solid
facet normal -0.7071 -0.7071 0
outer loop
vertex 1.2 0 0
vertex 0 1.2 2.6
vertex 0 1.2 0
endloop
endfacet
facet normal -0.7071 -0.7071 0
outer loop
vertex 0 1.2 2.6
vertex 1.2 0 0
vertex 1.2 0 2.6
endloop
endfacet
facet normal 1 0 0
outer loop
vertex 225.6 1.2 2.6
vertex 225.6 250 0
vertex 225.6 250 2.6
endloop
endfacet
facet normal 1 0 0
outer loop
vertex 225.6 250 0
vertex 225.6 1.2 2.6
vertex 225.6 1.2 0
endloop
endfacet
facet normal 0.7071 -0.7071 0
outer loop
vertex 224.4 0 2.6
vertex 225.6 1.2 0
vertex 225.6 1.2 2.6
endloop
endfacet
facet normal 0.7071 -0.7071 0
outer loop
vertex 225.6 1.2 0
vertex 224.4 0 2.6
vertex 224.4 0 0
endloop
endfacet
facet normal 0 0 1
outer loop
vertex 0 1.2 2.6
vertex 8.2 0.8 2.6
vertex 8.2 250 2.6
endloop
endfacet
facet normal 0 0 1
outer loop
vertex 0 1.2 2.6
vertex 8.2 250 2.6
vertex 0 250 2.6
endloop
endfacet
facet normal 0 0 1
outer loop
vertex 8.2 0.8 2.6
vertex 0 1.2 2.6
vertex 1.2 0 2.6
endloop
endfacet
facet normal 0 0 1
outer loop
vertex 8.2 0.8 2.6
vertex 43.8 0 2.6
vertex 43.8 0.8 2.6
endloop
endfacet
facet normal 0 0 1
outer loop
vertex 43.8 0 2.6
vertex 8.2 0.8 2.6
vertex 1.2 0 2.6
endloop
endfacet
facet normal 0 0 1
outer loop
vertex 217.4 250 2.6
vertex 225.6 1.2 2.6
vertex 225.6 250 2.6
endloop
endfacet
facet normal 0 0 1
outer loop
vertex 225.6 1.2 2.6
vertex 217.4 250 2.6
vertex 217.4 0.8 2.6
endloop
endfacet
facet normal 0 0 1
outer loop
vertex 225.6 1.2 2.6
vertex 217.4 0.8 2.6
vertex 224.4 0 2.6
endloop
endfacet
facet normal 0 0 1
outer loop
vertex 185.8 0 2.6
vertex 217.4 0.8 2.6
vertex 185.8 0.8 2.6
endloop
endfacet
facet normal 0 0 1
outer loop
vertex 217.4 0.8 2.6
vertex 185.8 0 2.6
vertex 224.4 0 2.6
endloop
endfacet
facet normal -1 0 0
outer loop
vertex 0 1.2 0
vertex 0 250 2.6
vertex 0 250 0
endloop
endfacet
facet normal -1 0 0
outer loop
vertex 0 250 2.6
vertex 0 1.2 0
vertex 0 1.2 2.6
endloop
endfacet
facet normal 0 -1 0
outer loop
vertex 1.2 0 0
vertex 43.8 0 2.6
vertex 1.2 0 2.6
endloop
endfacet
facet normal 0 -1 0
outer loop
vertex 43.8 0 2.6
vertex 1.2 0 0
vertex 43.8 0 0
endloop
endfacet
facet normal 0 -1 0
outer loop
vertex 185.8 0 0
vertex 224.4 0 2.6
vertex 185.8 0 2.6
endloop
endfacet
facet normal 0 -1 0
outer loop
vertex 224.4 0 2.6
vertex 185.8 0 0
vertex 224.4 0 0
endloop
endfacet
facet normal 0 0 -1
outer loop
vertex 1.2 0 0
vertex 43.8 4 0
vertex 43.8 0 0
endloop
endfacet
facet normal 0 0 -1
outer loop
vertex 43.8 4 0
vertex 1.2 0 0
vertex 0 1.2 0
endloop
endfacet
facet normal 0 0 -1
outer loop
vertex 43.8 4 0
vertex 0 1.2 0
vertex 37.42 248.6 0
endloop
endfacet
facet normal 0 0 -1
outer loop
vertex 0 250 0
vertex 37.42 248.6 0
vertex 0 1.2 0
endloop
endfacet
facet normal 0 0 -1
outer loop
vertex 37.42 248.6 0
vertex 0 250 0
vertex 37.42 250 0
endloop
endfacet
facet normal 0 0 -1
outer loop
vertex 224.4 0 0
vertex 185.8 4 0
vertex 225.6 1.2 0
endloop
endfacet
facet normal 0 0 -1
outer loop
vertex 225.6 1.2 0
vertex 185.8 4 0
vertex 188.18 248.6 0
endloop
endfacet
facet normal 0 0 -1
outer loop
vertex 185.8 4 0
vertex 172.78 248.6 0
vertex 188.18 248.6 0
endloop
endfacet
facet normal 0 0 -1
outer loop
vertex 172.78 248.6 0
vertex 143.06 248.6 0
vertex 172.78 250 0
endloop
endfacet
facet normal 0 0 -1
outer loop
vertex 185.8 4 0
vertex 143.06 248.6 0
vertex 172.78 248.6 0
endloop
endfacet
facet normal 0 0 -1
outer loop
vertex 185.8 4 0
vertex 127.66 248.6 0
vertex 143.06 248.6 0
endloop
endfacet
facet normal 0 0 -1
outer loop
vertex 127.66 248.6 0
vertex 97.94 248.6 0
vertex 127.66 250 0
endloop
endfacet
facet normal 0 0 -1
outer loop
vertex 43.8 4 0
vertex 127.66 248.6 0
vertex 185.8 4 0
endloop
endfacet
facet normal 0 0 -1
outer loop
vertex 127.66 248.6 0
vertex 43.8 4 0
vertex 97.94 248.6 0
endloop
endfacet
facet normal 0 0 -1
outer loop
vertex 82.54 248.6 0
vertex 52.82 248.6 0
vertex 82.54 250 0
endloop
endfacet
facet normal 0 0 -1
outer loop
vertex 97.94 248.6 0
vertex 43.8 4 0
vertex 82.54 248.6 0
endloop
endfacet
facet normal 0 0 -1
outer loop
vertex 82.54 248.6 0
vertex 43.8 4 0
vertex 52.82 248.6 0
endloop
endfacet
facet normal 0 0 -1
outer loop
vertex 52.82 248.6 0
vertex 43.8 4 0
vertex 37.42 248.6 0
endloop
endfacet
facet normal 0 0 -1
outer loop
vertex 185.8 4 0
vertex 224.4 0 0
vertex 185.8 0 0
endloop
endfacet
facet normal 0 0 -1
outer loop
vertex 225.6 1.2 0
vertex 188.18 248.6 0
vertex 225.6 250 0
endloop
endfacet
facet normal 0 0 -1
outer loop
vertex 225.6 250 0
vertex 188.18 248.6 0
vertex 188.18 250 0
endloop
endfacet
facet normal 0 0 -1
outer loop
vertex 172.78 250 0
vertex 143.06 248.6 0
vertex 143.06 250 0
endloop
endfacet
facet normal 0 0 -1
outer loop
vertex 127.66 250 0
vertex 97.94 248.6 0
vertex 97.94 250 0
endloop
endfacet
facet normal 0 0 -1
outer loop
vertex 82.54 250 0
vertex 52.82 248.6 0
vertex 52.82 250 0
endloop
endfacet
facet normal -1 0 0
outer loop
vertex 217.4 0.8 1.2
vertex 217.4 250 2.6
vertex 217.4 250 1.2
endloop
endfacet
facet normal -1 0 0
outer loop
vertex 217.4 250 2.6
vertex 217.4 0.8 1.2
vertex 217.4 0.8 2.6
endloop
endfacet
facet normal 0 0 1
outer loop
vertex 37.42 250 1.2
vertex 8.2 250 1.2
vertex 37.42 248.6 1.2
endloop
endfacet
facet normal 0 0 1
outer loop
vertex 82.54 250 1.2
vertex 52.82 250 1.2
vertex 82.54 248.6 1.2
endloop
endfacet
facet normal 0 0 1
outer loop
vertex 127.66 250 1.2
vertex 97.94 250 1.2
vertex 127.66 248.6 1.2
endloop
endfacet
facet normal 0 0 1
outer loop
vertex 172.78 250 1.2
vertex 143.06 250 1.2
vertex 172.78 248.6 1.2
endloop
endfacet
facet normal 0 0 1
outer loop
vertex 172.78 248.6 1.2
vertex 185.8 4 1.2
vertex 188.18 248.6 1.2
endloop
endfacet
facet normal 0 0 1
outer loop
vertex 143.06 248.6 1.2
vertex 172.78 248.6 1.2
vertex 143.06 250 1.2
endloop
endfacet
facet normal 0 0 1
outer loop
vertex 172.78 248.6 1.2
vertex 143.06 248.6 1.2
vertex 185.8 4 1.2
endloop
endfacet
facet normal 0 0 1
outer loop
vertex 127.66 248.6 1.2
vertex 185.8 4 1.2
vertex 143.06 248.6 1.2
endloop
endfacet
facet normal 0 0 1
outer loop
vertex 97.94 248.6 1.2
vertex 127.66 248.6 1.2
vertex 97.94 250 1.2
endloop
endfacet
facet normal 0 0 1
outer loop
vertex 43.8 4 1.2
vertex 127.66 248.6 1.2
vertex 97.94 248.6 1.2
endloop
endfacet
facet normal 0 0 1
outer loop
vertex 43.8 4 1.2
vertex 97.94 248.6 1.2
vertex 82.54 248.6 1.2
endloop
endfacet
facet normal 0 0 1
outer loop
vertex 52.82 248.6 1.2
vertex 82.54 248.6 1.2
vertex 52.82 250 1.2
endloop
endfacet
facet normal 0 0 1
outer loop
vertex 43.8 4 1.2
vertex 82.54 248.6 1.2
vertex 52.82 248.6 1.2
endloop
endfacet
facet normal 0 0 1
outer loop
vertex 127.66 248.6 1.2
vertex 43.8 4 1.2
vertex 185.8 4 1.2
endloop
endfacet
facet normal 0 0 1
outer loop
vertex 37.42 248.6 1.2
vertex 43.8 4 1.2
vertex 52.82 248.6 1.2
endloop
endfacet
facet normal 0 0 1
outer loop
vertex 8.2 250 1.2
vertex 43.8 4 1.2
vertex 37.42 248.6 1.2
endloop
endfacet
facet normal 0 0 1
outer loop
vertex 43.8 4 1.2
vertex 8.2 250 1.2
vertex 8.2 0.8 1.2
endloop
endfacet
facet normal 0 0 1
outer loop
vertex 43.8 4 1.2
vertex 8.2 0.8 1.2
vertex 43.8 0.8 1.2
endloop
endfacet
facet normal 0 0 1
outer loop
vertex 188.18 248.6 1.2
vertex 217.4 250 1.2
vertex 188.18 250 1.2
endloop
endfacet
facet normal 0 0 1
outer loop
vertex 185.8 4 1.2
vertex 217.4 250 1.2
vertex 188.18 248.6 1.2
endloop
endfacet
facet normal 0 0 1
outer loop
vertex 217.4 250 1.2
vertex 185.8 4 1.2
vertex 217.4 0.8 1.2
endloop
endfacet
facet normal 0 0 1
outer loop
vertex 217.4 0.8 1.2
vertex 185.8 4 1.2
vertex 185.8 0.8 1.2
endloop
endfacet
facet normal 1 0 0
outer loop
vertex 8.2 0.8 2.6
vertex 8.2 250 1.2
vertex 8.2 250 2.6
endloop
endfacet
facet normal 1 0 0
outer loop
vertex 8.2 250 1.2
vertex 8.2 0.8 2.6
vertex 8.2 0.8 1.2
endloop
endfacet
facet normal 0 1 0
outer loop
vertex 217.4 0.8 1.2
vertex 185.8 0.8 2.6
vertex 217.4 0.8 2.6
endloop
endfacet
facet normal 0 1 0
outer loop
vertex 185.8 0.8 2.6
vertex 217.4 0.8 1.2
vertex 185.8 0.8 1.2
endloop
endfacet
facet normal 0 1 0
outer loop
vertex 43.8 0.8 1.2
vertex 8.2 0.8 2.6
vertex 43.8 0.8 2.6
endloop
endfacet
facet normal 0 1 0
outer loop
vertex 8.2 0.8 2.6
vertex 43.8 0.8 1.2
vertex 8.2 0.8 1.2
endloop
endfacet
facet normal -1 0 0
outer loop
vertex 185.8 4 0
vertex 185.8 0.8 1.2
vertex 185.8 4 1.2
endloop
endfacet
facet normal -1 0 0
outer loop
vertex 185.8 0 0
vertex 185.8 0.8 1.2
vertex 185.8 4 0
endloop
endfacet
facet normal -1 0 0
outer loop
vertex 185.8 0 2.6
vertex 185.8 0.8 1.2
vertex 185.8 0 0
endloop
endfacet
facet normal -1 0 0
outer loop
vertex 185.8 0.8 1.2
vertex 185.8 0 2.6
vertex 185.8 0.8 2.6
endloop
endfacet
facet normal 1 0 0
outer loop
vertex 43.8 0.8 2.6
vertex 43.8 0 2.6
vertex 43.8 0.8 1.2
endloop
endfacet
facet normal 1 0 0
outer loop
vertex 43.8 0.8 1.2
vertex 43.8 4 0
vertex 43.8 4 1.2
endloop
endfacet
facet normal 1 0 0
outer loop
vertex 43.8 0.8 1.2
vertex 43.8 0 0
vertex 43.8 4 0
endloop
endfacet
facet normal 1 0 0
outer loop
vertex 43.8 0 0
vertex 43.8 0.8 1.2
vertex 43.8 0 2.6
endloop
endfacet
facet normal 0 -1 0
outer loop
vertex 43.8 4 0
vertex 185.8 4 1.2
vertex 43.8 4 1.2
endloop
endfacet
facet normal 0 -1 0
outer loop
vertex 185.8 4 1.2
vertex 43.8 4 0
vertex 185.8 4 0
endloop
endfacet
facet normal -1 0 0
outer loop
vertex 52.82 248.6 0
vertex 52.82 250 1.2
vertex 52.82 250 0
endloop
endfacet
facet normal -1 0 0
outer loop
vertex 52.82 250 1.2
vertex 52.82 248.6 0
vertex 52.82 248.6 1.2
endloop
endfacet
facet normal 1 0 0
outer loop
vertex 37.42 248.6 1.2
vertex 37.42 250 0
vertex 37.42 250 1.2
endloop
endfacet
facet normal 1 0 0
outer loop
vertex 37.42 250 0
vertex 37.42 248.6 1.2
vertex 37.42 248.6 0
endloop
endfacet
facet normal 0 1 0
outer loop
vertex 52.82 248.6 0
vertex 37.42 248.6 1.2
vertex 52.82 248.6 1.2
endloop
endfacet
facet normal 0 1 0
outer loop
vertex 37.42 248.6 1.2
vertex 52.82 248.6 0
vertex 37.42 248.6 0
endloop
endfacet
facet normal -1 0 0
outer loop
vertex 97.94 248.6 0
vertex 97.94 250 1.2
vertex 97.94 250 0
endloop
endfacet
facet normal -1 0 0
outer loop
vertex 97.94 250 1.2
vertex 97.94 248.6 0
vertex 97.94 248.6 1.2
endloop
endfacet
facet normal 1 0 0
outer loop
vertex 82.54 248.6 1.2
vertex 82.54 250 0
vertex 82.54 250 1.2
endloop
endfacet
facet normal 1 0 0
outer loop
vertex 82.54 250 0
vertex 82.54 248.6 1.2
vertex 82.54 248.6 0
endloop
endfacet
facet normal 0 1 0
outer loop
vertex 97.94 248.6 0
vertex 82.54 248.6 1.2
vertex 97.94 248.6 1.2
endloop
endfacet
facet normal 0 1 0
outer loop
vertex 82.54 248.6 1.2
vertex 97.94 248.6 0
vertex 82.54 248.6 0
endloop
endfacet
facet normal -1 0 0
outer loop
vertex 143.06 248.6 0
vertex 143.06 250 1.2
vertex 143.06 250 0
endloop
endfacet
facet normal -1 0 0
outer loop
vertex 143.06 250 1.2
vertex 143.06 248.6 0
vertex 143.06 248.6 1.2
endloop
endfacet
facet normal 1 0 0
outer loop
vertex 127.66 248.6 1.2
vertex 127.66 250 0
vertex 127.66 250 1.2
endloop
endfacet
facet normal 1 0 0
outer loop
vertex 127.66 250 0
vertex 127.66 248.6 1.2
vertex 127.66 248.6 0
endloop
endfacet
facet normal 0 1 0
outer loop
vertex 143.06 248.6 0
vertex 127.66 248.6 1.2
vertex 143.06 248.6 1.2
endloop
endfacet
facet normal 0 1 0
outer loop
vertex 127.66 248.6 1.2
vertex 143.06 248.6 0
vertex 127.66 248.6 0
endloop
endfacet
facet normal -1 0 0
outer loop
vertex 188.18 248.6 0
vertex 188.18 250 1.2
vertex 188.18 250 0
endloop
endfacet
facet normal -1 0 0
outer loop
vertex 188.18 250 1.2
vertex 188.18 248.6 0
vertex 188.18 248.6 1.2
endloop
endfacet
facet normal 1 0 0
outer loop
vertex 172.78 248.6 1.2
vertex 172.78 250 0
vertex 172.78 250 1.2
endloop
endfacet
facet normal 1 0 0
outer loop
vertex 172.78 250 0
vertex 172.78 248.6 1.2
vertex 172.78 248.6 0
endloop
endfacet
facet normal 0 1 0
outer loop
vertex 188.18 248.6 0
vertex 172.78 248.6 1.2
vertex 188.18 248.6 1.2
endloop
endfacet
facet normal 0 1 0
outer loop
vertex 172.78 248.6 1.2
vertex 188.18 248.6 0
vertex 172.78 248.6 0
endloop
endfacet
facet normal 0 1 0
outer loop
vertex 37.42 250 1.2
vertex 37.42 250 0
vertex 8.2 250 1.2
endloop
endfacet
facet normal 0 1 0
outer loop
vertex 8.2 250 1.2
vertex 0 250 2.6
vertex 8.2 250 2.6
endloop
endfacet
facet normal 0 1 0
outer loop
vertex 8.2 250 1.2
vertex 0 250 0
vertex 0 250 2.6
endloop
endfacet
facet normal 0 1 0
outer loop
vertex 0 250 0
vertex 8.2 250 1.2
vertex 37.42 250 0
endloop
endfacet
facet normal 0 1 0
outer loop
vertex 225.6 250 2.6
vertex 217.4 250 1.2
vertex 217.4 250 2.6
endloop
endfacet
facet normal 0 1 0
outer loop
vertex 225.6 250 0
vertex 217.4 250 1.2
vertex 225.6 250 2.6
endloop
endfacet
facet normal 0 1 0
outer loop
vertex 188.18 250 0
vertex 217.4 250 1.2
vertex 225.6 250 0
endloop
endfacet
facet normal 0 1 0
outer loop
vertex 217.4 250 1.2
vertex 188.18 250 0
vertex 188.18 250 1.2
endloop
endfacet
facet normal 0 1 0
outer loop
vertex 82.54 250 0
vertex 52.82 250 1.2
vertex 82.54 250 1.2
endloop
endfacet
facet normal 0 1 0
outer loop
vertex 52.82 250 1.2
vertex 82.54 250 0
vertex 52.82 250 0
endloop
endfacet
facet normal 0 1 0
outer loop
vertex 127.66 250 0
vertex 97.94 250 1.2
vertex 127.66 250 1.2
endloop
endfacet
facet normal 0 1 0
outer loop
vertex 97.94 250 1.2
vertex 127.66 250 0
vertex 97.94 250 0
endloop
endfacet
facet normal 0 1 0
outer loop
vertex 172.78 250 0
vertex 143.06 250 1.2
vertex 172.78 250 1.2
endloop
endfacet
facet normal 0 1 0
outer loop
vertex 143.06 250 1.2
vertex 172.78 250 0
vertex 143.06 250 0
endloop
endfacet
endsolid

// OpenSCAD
// file: common.scad
// ============================================================
// Photo Frame for 13.3" Spectra 6 E-Ink Display
// Shared parameters and utility modules
// ============================================================

/* [Display Parameters] */
// Active (visible) area
active_w = 202.8;
active_h = 270.4;
// Glass outline dimensions
glass_w = 208.8;
glass_h = 284.7;
display_d = 0.85;
// Non-active border (asymmetric)
border_left   = 3.0;
border_right  = 3.0;
border_top    = 3.0;
border_bottom = 11.3;   // 284.7 - 270.4 - 3 = 11.3, FPC side, large non-active area

/* [Driver Board Parameters] */
board_w = 80;
board_h = 40;
board_d = 1.6;
board_clearance = 10;     // component height clearance

/* [Battery Parameters] */
battery_w = 60;
battery_h = 35;
battery_d = 8;

/* [Frame Parameters] */
bezel_w    = 10;          // bezel width around active area
wall_thick = 2.4;         // front frame thickness
back_thick = 1.2;         // back panel thickness (6 layers @ 0.2mm)
frame_d    = 2.6;         // total frame depth (1.2mm back + 1.4mm cavity)
tol        = 0.2;
corner_r   = 3;

/* [Channel Parameters] */
outer_wall  = 2.0;        // outer wall thickness on bezel
inner_lip_d = 0.3;        // inner lip depth (presses on display)
channel_tol = 0.2;        // clearance for back panel in channel
lip_overlap = 2.0;        // how much bezel overlaps the glass on each side

/* [Printer Limits] */
bed_max = 260;

/* [Stand Parameters] */
stand_angle = 12;         // tilt angle in degrees
stand_foot_depth = 100;   // how far the base extends back

/* [FPC Cable] */
// 60-pin FPC exits from bottom of display, offset 2mm to the right
fpc_w = 134;              // FPC ribbon width
fpc_slot_w = fpc_w + 8;   // slot width with clearance (+4mm wider)
fpc_offset_x = 2;         // shifted 2mm to the right from center
fpc_slot_h = 6;

/* [Buttons - 1 reset + 3 custom] */
button_dia     = 3.5;
button_spacing = 12;
button_count   = 4;

/* [Joint Parameters] */
tongue_depth  = 1.2;      // tongue-and-groove interlock depth
tongue_length = 15;        // each tongue segment length
tongue_count  = 4;         // number of tongue segments along width
screw_r       = 1.5;       // M3 screw radius

// ============================================================
// Derived dimensions
// ============================================================

cavity_w = glass_w + 2 * tol;
cavity_h = glass_h + 2 * tol;

frame_w = cavity_w + 2 * bezel_w;
frame_h = cavity_h + 2 * bezel_w;

// Back panel rim widths (design parameters)
panel_rim  = 8.2;    // rim on left, right, top
bottom_rim = 0.8;    // thin bottom rim (hidden in base)

// Derived panel dimensions
panel_w = cavity_w + 2 * panel_rim;
panel_h = cavity_h + panel_rim + bottom_rim;
panel_inset = (frame_w - panel_w) / 2;  // how far panel is inset from bezel edge

// Inner lip width: derived to fill gap between panel rim and window
// Layout: outer_wall + channel_tol + panel_rim + channel_tol + inner_lip_w = win_x
inner_lip_w = bezel_w + tol + lip_overlap - outer_wall - panel_rim - 2 * channel_tol;

// Back panel split: bottom piece as tall as fits the bed
back_split_y = bed_max - 10;   // 250mm from bottom, top piece ~60mm

// Base dimensions (foot/stand only, attaches to bottom of back panel)
base_wall = wall_thick;
base_total_depth = stand_foot_depth;

// ============================================================
// Utility modules
// ============================================================

module rounded_rect(w, h, d, r) {
    linear_extrude(d)
        offset(r = r)
            offset(r = -r)
                square([w, h]);
}

module rounded_rect_2d(w, h, r) {
    offset(r = r)
        offset(r = -r)
            square([w, h]);
}

// Tongue segments along X axis at a given Y position
module tongue_strip(width, y_pos, z_pos, depth, length, count) {
    spacing = width / (count + 1);
    for (i = [1 : count]) {
        translate([i * spacing - length / 2, y_pos, z_pos])
            cube([length, depth, back_thick]);
    }
}

// ============================================================
// Front bezel - mitered picture frame style (4 sides)
// ============================================================

// Window position and size (derived from glass position + lip overlap)
win_x = bezel_w + tol + lip_overlap;
win_y = bezel_w + tol + lip_overlap;
win_w = glass_w - 2 * lip_overlap;
win_h = glass_h - 2 * lip_overlap;

// Bezel Z layout:
//   z=0                           bottom of outer wall (back of frame)
//   z=frame_d                     bezel body bottom (= back panel top)
//   z=frame_d+wall_thick          bezel front face

module front_bezel_full() {
    union() {
        // 1. Bezel body (visible frame, sits on top of back panel)
        difference() {
            translate([0, 0, frame_d])
                rounded_rect(frame_w, frame_h, wall_thick, corner_r);

            // Window opening - sharp corners (display glass is rectangular)
            translate([win_x, win_y, -0.1])
                cube([win_w, win_h, frame_d + wall_thick + 0.2]);
        }

        // 2. Outer wall (wraps around back panel edge)
        difference() {
            rounded_rect(frame_w, frame_h, frame_d + wall_thick, corner_r);

            // Hollow inside - sharp corners
            translate([outer_wall, outer_wall, -0.1])
                cube([
                    frame_w - 2 * outer_wall,
                    frame_h - 2 * outer_wall,
                    frame_d + wall_thick + 0.2
                ]);
        }

        // 3. Inner lip (presses on display glass)
        difference() {
            translate([win_x - inner_lip_w, win_y - inner_lip_w, frame_d - inner_lip_d])
                cube([win_w + 2 * inner_lip_w, win_h + 2 * inner_lip_w, inner_lip_d]);

            translate([win_x, win_y, frame_d - inner_lip_d - 0.1])
                cube([win_w, win_h, inner_lip_d + 0.2]);
        }
    }
}

// 45-degree miter cutting regions for each side
// Each region is a 2D polygon extruded tall enough to cut the bezel
e = 1; // margin for clean cuts

// Bottom: below both 45° lines from bottom corners
module miter_region_bottom() {
    linear_extrude(50, center = true)
        polygon([[-e, -e], [frame_w + e, -e], [frame_w / 2, frame_w / 2]]);
}

// Top: above both 45° lines from top corners
module miter_region_top() {
    linear_extrude(50, center = true)
        polygon([[-e, frame_h + e], [frame_w + e, frame_h + e],
                 [frame_w / 2, frame_h - frame_w / 2]]);
}

// Left: between 45° lines from both left corners
module miter_region_left() {
    linear_extrude(50, center = true)
        polygon([[-e, -e], [frame_h / 2, frame_h / 2], [-e, frame_h + e]]);
}

// Right: between 45° lines from both right corners
module miter_region_right() {
    linear_extrude(50, center = true)
        polygon([[frame_w + e, -e],
                 [frame_w - frame_h / 2, frame_h / 2],
                 [frame_w + e, frame_h + e]]);
}

// Full back panel (smaller than bezel, fits inside channel)
module back_panel_full() {
    // FPC slot X position: centered + offset to the right
    fpc_x = (panel_w - fpc_slot_w) / 2 + fpc_offset_x;

    difference() {
        rounded_rect(panel_w, panel_h, frame_d, max(corner_r - panel_inset, 0.5));

        // Display cavity
        translate([panel_rim, bottom_rim, back_thick])
            cube([cavity_w, cavity_h, frame_d]);

        // FPC cable exit slot at bottom (offset 2mm to right)
        translate([fpc_x, -0.1, back_thick])
            cube([fpc_slot_w, bottom_rim + 0.1, frame_d - back_thick + 0.1]);

        // FPC ribbon gap: 4mm zone from panel bottom edge
        // Goes through the full back wall so ribbon can fold freely
        fpc_gap = 4;
        translate([fpc_x, 0, -0.1])
            cube([fpc_slot_w, fpc_gap, frame_d + 0.1]);
    }
}
// main file
// ============================================================
// Back Panel - Bottom (large piece, ~250mm tall, includes FPC slot)
// ============================================================
include <common.scad>

module back_panel_bottom() {
    difference() {
        back_panel_full();
        // Cut away top portion
        translate([-1, back_split_y, -1])
            cube([panel_w + 2, panel_h + 2, frame_d + 2]);
        // Groove slots to receive tongues from top piece
        // Cut through full back wall depth (back_thick + margin)
        groove_y = back_split_y - tongue_depth - tol;
        groove_depth = tongue_depth + 2 * tol;
        groove_len = tongue_length + 2 * tol;
        groove_spacing = panel_w / (tongue_count + 1);
        for (i = [1 : tongue_count]) {
            translate([i * groove_spacing - groove_len / 2, groove_y, -0.1])
                cube([groove_len, groove_depth, back_thick + 0.2]);
        }
    }
}

back_panel_bottom();
